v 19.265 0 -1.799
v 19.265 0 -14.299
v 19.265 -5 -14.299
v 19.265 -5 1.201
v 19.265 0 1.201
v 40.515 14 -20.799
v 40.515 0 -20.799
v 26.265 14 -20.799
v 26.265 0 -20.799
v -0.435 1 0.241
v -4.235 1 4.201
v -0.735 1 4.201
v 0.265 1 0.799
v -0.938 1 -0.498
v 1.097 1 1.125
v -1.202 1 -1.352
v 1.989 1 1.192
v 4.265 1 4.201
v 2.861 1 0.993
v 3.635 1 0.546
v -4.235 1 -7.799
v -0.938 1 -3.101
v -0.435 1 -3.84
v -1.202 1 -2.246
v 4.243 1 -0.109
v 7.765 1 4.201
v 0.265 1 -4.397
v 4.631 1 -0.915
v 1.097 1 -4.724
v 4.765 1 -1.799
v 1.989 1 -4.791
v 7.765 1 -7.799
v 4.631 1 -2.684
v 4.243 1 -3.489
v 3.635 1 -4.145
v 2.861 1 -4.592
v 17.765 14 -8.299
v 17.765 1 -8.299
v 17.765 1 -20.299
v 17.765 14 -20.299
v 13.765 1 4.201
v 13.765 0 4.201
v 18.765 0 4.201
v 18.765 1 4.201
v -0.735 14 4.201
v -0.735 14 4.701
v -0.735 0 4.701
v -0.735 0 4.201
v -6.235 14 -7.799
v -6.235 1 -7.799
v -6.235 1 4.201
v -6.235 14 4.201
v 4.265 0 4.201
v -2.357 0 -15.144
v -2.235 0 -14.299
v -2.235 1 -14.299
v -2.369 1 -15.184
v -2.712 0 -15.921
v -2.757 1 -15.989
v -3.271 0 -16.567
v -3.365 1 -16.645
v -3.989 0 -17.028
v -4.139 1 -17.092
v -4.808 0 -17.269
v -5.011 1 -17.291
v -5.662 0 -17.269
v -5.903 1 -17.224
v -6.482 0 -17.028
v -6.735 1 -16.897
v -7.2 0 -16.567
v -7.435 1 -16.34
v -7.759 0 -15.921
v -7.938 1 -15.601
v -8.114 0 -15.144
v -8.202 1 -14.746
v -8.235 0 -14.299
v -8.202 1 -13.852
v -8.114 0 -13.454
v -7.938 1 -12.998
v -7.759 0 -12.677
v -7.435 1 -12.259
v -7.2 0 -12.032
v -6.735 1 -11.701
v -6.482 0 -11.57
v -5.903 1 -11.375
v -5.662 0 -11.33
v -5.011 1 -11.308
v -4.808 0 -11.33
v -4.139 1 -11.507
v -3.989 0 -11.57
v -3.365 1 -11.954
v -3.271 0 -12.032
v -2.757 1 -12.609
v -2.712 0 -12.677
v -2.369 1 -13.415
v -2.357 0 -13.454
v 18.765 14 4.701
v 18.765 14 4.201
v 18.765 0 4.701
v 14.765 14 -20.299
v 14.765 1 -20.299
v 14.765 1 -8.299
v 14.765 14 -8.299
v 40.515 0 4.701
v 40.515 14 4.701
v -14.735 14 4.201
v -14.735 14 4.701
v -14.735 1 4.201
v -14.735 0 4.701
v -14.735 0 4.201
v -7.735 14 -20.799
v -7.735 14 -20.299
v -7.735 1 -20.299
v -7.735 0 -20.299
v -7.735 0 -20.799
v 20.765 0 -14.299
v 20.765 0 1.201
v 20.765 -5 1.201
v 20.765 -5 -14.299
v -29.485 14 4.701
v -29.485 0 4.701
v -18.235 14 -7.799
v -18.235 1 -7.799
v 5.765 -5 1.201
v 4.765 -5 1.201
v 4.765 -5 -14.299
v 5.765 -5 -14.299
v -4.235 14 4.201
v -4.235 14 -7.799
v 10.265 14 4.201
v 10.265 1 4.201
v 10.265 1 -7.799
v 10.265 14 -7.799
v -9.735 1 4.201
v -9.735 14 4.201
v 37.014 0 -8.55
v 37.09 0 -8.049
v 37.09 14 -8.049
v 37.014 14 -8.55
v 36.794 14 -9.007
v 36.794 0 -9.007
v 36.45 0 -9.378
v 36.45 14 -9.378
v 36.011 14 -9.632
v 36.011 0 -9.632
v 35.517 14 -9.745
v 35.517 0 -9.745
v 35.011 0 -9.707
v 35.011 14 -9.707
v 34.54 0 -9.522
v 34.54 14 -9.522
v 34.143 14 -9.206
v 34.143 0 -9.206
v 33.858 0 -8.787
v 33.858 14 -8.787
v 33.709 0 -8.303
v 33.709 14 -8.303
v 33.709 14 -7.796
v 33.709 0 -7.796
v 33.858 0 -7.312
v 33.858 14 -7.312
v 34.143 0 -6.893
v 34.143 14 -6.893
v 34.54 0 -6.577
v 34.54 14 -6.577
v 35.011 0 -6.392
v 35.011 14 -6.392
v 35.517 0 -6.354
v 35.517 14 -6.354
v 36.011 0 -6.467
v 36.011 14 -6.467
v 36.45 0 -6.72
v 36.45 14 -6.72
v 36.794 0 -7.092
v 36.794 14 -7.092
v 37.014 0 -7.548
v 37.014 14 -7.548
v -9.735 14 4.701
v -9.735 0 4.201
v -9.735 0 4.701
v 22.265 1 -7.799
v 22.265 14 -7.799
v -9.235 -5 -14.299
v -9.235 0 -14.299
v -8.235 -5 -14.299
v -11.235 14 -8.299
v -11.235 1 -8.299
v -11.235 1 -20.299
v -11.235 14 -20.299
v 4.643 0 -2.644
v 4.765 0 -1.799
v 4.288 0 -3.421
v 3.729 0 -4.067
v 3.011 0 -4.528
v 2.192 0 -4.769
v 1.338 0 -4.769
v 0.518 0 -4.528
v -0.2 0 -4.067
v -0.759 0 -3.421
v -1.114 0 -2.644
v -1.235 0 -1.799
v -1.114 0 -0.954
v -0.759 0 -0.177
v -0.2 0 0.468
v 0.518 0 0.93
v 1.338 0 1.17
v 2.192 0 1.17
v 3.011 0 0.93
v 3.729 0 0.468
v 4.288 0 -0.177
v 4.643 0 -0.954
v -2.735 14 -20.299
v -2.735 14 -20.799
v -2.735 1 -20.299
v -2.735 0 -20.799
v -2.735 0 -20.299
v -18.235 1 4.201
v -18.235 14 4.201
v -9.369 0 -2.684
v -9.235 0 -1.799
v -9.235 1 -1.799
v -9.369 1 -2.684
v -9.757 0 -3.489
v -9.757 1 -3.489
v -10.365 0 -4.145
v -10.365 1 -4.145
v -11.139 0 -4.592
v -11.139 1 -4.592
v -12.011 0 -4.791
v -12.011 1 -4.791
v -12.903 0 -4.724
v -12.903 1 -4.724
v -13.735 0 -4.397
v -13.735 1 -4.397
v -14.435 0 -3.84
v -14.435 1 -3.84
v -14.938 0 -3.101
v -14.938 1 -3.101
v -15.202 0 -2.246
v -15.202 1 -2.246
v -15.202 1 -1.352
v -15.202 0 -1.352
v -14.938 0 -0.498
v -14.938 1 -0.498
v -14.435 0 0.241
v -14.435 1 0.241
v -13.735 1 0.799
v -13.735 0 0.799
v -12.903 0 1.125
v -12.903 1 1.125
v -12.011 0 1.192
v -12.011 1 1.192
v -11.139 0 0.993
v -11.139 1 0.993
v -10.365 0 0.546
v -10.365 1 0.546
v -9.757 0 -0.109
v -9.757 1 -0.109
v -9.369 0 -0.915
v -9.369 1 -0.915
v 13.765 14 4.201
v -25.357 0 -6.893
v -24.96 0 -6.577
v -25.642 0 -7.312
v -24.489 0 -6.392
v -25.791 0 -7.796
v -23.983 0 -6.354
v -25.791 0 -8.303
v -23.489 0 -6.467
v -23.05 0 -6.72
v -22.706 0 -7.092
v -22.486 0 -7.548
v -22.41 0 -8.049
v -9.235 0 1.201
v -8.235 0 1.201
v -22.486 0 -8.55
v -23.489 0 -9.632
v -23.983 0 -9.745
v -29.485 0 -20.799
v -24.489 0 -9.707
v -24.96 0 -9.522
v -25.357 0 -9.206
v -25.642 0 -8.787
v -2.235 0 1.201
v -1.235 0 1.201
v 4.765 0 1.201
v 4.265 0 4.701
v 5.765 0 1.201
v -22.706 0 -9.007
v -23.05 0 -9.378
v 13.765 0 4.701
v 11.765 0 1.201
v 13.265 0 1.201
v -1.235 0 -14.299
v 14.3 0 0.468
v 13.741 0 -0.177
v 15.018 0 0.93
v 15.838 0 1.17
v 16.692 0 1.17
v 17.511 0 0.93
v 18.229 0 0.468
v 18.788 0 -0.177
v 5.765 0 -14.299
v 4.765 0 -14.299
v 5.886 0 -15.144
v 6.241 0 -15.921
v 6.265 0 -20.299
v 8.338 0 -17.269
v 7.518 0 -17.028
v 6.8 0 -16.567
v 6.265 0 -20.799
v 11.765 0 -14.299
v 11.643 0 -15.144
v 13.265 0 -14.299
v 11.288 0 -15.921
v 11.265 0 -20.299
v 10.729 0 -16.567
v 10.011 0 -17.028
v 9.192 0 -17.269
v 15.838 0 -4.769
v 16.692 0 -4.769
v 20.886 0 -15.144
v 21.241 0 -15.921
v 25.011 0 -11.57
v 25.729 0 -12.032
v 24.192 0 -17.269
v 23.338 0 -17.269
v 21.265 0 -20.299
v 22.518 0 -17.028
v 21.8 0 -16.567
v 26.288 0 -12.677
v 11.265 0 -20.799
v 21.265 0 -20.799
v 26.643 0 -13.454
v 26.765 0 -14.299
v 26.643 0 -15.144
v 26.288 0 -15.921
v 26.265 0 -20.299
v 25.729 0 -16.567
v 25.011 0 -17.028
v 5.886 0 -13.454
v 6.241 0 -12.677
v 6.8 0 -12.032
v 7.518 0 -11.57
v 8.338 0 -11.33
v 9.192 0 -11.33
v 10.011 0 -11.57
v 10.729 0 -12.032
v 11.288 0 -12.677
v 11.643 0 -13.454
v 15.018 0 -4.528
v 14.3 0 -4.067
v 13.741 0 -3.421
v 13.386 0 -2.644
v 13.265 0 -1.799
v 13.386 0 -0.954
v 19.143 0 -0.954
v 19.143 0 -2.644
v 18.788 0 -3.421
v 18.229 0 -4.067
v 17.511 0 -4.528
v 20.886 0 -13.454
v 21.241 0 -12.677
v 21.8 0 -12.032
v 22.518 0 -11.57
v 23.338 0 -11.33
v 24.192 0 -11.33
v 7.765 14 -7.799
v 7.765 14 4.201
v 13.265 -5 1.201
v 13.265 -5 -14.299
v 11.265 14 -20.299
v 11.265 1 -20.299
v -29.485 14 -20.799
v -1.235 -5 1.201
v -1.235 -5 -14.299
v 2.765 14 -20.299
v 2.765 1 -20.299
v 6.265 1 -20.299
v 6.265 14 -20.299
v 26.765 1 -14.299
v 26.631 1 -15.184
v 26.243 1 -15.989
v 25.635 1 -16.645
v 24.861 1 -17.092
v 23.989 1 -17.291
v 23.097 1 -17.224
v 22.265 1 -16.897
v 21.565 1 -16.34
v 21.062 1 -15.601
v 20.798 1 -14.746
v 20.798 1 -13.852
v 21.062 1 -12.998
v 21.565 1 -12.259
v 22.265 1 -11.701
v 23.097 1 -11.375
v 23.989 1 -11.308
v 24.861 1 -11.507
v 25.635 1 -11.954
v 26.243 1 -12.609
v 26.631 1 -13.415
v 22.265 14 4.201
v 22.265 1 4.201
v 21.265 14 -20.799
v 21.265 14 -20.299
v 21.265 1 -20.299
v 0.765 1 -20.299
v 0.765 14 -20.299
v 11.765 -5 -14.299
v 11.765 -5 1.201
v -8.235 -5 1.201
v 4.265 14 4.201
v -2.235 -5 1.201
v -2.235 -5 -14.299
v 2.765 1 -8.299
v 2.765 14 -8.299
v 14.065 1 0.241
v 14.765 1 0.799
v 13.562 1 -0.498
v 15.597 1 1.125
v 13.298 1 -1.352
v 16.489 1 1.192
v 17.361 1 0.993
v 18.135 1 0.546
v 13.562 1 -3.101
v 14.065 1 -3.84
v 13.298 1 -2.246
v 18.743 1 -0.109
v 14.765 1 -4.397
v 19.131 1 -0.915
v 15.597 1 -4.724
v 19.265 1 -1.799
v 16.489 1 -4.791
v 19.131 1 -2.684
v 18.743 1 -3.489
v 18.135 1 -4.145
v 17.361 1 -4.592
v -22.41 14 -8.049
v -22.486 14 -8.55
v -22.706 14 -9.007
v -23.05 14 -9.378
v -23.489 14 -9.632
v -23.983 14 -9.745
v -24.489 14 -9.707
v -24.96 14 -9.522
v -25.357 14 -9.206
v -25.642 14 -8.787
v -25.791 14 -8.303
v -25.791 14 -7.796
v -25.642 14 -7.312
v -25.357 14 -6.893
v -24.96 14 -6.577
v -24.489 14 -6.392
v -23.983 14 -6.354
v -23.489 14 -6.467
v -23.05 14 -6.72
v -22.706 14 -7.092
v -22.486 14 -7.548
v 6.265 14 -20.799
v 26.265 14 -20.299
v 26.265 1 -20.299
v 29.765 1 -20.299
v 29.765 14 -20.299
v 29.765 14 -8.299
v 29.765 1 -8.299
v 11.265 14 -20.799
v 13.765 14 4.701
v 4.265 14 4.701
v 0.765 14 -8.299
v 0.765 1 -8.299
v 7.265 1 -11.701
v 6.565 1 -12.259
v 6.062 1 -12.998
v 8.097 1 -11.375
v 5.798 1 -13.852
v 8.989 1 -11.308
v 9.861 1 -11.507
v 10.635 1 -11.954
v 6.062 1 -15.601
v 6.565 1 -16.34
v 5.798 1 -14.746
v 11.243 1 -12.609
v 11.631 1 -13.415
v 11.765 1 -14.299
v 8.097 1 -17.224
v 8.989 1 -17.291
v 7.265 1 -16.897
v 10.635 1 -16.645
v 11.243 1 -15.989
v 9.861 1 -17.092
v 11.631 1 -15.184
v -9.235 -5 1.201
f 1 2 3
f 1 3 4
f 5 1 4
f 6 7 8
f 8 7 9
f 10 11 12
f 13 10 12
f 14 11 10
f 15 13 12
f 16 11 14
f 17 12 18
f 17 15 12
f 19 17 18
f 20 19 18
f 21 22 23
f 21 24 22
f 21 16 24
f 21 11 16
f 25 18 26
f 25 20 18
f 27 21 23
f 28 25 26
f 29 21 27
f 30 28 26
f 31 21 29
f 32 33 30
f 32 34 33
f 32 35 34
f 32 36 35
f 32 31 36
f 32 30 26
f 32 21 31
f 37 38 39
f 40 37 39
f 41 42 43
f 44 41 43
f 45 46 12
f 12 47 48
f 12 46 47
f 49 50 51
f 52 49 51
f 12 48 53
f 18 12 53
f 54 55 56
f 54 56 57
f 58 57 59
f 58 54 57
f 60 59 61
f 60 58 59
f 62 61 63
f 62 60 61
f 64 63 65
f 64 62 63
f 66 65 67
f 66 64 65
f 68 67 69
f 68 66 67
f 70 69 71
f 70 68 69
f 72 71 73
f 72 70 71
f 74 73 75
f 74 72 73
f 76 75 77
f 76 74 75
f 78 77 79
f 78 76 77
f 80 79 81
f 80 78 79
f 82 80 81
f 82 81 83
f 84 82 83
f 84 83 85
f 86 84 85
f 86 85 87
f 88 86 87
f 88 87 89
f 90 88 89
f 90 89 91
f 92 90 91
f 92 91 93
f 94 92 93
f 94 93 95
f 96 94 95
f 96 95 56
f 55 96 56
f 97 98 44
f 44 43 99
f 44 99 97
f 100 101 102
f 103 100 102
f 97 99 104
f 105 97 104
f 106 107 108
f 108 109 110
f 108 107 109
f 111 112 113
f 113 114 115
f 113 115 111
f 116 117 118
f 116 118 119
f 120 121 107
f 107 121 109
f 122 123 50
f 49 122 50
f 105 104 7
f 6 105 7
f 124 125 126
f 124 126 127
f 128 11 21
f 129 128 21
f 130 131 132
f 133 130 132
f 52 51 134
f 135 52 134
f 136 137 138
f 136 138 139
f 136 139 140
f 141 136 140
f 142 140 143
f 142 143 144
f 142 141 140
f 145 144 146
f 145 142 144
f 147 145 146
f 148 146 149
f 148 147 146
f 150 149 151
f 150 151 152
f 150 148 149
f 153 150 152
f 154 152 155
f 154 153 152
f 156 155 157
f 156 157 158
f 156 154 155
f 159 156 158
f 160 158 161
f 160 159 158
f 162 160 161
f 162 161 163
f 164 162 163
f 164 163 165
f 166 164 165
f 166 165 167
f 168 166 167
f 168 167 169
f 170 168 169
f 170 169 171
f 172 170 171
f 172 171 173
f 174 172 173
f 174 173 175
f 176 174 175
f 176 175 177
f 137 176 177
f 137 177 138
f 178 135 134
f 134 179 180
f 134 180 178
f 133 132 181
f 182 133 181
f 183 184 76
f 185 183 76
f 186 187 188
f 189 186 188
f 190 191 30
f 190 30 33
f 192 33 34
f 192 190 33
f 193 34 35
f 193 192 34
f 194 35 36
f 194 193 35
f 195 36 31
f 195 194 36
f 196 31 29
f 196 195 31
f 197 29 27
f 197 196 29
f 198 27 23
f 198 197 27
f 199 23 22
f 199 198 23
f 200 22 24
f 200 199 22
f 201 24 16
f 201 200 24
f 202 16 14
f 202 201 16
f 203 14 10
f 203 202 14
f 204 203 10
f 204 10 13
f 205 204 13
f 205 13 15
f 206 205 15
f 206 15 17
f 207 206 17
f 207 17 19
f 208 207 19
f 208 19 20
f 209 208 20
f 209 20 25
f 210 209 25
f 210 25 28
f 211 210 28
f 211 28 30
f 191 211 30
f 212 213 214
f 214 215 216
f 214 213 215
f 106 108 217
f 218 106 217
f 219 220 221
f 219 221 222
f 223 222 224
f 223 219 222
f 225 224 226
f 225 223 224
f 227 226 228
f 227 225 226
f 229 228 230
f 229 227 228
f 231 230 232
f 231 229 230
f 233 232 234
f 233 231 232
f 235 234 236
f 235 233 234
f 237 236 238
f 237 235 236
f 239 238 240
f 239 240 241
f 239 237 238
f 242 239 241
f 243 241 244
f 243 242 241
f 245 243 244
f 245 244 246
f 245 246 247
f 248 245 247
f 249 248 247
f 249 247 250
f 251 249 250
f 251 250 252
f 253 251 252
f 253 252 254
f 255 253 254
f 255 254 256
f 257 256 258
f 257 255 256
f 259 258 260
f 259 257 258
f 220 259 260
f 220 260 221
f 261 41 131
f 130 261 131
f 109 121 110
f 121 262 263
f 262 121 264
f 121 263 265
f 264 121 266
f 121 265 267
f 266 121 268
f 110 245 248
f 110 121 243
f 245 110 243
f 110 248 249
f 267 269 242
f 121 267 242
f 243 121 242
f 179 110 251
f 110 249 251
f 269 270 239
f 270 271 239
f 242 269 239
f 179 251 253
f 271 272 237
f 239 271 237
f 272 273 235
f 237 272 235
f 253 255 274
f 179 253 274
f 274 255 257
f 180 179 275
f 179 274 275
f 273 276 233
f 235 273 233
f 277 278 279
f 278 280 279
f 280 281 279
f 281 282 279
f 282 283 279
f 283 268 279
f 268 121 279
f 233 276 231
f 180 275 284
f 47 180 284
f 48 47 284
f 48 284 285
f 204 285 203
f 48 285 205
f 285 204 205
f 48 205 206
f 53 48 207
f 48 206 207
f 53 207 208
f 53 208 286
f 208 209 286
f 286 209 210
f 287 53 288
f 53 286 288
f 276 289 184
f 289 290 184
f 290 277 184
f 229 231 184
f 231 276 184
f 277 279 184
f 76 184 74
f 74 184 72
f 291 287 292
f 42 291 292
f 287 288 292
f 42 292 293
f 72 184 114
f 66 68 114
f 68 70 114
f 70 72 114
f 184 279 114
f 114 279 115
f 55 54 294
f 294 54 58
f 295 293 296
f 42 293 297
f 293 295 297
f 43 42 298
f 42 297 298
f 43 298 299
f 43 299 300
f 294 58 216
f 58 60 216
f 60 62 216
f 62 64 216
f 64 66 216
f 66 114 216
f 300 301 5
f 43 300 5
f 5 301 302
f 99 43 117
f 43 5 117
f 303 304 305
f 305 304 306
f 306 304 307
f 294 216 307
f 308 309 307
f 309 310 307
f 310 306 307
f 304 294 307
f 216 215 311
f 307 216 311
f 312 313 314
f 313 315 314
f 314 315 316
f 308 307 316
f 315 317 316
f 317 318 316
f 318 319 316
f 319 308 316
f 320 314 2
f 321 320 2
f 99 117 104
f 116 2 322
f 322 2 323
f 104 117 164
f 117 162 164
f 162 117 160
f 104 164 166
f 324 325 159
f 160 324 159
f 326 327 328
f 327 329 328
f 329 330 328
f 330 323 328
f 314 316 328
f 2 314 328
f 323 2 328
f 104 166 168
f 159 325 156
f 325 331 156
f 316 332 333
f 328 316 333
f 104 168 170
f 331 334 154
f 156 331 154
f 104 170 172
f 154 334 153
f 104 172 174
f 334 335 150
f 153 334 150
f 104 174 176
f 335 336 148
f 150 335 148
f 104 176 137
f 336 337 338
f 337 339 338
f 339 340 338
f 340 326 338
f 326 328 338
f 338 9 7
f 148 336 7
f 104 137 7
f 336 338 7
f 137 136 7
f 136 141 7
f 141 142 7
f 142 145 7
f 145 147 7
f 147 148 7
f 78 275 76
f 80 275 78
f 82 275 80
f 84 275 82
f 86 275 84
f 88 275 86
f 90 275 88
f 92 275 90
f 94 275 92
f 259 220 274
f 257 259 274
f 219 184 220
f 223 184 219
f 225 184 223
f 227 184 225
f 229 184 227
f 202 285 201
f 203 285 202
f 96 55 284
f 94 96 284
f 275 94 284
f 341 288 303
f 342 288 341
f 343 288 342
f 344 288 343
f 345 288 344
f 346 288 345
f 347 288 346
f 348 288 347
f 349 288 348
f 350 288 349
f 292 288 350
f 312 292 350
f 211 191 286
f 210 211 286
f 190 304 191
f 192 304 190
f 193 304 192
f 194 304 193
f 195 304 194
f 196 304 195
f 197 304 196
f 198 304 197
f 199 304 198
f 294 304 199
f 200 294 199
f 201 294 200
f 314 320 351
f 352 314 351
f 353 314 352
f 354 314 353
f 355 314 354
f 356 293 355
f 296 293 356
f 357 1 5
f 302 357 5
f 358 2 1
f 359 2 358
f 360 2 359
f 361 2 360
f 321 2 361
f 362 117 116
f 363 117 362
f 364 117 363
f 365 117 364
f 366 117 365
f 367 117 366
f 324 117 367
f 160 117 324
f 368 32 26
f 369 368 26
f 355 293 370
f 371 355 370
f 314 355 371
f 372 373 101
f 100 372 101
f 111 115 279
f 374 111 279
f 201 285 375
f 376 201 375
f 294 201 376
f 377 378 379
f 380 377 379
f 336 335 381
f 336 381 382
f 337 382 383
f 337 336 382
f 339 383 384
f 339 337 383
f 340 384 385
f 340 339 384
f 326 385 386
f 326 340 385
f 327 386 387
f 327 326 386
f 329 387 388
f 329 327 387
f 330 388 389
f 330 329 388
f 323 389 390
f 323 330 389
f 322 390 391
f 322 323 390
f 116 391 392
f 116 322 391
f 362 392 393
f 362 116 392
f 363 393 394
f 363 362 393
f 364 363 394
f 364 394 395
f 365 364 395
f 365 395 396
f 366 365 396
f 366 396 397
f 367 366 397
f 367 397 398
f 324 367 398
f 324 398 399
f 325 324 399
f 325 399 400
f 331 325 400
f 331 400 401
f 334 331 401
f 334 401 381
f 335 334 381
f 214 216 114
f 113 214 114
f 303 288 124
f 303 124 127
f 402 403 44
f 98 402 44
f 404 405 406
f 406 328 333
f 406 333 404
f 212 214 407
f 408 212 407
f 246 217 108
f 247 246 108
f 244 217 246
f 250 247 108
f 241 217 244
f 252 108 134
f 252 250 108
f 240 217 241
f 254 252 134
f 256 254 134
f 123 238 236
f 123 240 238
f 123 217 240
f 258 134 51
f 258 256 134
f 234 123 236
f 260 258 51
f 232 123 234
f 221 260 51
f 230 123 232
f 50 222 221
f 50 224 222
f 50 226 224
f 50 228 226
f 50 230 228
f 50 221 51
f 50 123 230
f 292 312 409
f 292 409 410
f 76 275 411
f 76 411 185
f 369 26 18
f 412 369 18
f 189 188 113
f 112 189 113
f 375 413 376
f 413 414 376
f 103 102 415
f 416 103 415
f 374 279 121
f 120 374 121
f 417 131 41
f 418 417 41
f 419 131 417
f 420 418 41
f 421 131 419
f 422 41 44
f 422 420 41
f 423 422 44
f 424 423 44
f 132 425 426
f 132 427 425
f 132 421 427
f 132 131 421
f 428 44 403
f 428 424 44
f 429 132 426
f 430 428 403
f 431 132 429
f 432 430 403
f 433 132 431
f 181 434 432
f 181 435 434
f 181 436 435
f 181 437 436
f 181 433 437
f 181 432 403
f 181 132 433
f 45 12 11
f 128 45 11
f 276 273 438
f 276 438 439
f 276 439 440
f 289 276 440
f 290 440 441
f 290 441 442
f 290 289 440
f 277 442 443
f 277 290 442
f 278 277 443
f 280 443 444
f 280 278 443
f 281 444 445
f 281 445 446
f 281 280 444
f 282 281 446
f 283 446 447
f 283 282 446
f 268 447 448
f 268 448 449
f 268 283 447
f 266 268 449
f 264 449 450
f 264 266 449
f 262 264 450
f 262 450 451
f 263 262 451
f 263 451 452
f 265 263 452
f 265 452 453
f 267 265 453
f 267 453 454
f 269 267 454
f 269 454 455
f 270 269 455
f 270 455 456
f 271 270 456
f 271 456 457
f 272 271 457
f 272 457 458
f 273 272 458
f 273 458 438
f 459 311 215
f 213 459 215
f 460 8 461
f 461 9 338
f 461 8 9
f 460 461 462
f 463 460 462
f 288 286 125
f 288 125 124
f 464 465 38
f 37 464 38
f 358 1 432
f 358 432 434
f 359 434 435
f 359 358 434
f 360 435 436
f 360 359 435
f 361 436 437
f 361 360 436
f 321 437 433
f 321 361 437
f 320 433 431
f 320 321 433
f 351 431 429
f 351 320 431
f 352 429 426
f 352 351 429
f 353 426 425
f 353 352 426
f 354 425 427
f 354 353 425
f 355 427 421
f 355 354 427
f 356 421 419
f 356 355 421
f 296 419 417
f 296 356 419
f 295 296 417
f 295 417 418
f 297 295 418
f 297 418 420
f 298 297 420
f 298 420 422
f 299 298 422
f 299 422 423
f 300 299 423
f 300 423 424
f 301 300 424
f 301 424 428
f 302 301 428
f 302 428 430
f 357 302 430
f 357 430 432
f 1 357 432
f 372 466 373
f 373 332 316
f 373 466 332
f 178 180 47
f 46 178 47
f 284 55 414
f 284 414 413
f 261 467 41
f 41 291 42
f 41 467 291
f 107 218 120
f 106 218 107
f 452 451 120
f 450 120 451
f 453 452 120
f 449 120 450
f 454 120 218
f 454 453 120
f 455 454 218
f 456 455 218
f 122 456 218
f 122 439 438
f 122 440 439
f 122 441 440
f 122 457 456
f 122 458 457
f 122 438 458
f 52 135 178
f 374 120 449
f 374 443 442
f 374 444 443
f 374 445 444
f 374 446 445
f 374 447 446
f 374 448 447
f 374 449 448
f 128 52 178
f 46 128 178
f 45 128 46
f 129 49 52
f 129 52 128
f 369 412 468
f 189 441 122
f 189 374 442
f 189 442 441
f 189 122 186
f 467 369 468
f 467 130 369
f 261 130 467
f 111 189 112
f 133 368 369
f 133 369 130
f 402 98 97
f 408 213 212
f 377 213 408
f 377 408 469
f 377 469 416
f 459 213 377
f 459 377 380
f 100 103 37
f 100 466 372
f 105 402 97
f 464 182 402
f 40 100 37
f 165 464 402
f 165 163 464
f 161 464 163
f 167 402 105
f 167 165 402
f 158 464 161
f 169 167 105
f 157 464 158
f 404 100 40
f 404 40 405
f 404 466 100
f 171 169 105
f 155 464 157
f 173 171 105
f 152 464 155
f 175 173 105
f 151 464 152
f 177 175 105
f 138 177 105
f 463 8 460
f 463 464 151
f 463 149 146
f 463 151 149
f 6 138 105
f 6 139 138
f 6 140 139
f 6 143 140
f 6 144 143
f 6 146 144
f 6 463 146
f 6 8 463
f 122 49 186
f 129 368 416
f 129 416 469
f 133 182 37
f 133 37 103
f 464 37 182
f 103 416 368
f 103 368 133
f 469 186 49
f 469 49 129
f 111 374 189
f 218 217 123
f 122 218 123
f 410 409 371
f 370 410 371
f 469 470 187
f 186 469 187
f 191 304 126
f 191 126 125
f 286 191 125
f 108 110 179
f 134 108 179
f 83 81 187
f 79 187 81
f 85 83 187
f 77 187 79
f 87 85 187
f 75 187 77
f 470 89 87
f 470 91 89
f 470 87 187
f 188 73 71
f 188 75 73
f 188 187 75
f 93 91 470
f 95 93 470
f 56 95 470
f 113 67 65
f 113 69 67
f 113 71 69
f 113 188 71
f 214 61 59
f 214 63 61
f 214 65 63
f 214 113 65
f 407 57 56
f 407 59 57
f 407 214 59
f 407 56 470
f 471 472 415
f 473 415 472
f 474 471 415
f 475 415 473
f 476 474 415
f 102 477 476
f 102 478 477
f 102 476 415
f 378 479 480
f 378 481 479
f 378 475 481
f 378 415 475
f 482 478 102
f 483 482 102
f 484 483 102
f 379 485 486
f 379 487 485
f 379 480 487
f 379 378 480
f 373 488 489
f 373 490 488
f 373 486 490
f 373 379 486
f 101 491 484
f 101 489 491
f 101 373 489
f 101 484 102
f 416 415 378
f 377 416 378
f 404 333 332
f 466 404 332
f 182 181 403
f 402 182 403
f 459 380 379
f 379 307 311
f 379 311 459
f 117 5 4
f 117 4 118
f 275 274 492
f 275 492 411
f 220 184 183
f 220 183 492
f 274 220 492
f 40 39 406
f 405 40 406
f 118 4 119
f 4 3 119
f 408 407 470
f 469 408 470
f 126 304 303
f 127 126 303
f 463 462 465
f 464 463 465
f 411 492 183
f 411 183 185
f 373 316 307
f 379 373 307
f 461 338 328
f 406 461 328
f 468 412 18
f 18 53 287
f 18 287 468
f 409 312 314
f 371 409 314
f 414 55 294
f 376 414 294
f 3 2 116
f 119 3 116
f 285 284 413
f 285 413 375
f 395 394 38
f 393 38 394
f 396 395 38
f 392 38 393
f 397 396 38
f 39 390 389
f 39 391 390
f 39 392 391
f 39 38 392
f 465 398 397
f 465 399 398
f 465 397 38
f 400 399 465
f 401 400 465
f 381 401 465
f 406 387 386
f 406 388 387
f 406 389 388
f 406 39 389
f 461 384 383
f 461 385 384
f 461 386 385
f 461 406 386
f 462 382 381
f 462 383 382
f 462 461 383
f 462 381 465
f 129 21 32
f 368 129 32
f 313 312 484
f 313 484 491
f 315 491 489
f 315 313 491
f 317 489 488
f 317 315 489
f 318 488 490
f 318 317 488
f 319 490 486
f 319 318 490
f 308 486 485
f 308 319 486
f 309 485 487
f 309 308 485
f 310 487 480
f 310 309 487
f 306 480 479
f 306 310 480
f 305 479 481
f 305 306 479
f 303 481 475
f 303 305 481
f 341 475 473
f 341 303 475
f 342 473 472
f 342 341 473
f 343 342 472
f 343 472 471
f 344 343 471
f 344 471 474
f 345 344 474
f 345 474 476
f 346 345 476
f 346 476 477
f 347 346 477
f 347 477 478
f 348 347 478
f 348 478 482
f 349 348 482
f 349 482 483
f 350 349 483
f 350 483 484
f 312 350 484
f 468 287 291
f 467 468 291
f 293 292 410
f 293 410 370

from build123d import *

# Parameters (mm, degrees)
SKETCH1_R           = 3
SKETCH1_R_2         = 1.7
BOSS_EXTRUDE1_DEPTH = 1
SKETCH1_4_R         = 1.7
BOSS_EXTRUDE2_DEPTH = 14
SKETCH1_5_W         = 1
SKETCH1_5_H         = 15.5
SKETCH1_5_W_2       = 1.5
BOSS_EXTRUDE3_DEPTH = 5


with BuildPart() as part:
    # Sketch1 → Boss-Extrude1 (new body)
    with BuildSketch(Plane(origin=(0, 0, 0), x_dir=(1, 0, 0), z_dir=(0, 1, 0))):
        Polygon((-14.735418885, -4.200712669), (-9.735418885, -4.200712669), (-9.735418885, -4.700712669), (-4.735418885, -4.700712669), (-0.735418885, -4.700712669), (-0.735418885, -4.200712669), (4.264581115, -4.200712669), (4.264581115, -4.700712669), (13.764581115, -4.700712669), (13.764581115, -4.200712669), (18.764581115, -4.200712669), (18.764581115, -4.700712669), (40.514581115, -4.700712669), (40.514581115, 20.799287331), (26.264581115, 20.799287331), (26.264581115, 20.299287331), (21.264581115, 20.299287331), (21.264581115, 20.799287331), (11.264581115, 20.799287331), (11.264581115, 20.299287331), (6.264581115, 20.299287331), (6.264581115, 20.799287331), (1.264581115, 20.799287331), (-2.735418885, 20.799287331), (-2.735418885, 20.299287331), (-7.735418885, 20.299287331), (-7.735418885, 20.799287331), (-29.485418885, 20.799287331), (-29.485418885, -4.700712669), (-14.735418885, -4.700712669), align=None)
        with Locations((-12.235418885, 1.799287331)):
            Circle(SKETCH1_R, mode=Mode.SUBTRACT)
        with Locations((-24.110418885, 8.049287331)):
            Circle(SKETCH1_R_2, mode=Mode.SUBTRACT)
        with Locations((-5.235418885, 14.299287331)):
            Circle(SKETCH1_R, mode=Mode.SUBTRACT)
        with Locations((1.764581115, 1.799287331)):
            Circle(SKETCH1_R, mode=Mode.SUBTRACT)
        with Locations((8.764581115, 14.299287331)):
            Circle(SKETCH1_R, mode=Mode.SUBTRACT)
        with Locations((16.264581115, 1.799287331)):
            Circle(SKETCH1_R, mode=Mode.SUBTRACT)
        with Locations((23.764581115, 14.299287331)):
            Circle(SKETCH1_R, mode=Mode.SUBTRACT)
        with Locations((35.389581115, 8.049287331)):
            Circle(SKETCH1_R_2, mode=Mode.SUBTRACT)
    extrude(amount=BOSS_EXTRUDE1_DEPTH)

    # Sketch1<4> → Boss-Extrude2 (add)
    with BuildSketch(Plane(origin=(0, 0, 0), x_dir=(1, 0, 0), z_dir=(0, 1, 0))):
        Polygon((-18.235418885, -4.200712669), (-18.235418885, 7.799287331), (-6.235418885, 7.799287331), (-6.235418885, -4.200712669), (-9.735418885, -4.200712669), (-9.735418885, -4.700712669), (-4.735418885, -4.700712669), (-0.735418885, -4.700712669), (-0.735418885, -4.200712669), (-4.235418885, -4.200712669), (-4.235418885, 7.799287331), (1.264581115, 7.799287331), (7.764581115, 7.799287331), (7.764581115, -4.200712669), (4.264581115, -4.200712669), (4.264581115, -4.700712669), (13.764581115, -4.700712669), (13.764581115, -4.200712669), (10.264581115, -4.200712669), (10.264581115, 7.799287331), (22.264581115, 7.799287331), (22.264581115, -4.200712669), (18.764581115, -4.200712669), (18.764581115, -4.700712669), (40.514581115, -4.700712669), (40.514581115, 20.799287331), (26.264581115, 20.799287331), (26.264581115, 20.299287331), (29.764581115, 20.299287331), (29.764581115, 8.299287331), (17.764581115, 8.299287331), (17.764581115, 20.299287331), (21.264581115, 20.299287331), (21.264581115, 20.799287331), (11.264581115, 20.799287331), (11.264581115, 20.299287331), (14.764581115, 20.299287331), (14.764581115, 8.299287331), (2.764581115, 8.299287331), (2.764581115, 20.299287331), (6.264581115, 20.299287331), (6.264581115, 20.799287331), (1.264581115, 20.799287331), (-2.735418885, 20.799287331), (-2.735418885, 20.299287331), (0.764581115, 20.299287331), (0.764581115, 8.299287331), (-11.235418885, 8.299287331), (-11.235418885, 20.299287331), (-7.735418885, 20.299287331), (-7.735418885, 20.799287331), (-29.485418885, 20.799287331), (-29.485418885, -4.700712669), (-14.735418885, -4.700712669), (-14.735418885, -4.200712669), align=None)
        with Locations((-24.110418885, 8.049287331)):
            Circle(SKETCH1_4_R, mode=Mode.SUBTRACT)
        with Locations((35.389581115, 8.049287331)):
            Circle(SKETCH1_4_R, mode=Mode.SUBTRACT)
    extrude(amount=BOSS_EXTRUDE2_DEPTH)

    # Sketch1<5> → Boss-Extrude3 (add)
    with BuildSketch(Plane(origin=(0, 0, 0), x_dir=(1, 0, 0), z_dir=(0, 1, 0))):
        with Locations((-8.735418885, 6.549287331)):
            Rectangle(SKETCH1_5_W, SKETCH1_5_H)
        with Locations((-1.735418885, 6.549287331)):
            Rectangle(SKETCH1_5_W, SKETCH1_5_H)
        with Locations((5.264581115, 6.549287331)):
            Rectangle(SKETCH1_5_W, SKETCH1_5_H)
        with Locations((12.514581115, 6.549287331)):
            Rectangle(SKETCH1_5_W_2, SKETCH1_5_H)
        with Locations((20.014581115, 6.549287331)):
            Rectangle(SKETCH1_5_W_2, SKETCH1_5_H)
    extrude(amount=-BOSS_EXTRUDE3_DEPTH)


solid = part.part
